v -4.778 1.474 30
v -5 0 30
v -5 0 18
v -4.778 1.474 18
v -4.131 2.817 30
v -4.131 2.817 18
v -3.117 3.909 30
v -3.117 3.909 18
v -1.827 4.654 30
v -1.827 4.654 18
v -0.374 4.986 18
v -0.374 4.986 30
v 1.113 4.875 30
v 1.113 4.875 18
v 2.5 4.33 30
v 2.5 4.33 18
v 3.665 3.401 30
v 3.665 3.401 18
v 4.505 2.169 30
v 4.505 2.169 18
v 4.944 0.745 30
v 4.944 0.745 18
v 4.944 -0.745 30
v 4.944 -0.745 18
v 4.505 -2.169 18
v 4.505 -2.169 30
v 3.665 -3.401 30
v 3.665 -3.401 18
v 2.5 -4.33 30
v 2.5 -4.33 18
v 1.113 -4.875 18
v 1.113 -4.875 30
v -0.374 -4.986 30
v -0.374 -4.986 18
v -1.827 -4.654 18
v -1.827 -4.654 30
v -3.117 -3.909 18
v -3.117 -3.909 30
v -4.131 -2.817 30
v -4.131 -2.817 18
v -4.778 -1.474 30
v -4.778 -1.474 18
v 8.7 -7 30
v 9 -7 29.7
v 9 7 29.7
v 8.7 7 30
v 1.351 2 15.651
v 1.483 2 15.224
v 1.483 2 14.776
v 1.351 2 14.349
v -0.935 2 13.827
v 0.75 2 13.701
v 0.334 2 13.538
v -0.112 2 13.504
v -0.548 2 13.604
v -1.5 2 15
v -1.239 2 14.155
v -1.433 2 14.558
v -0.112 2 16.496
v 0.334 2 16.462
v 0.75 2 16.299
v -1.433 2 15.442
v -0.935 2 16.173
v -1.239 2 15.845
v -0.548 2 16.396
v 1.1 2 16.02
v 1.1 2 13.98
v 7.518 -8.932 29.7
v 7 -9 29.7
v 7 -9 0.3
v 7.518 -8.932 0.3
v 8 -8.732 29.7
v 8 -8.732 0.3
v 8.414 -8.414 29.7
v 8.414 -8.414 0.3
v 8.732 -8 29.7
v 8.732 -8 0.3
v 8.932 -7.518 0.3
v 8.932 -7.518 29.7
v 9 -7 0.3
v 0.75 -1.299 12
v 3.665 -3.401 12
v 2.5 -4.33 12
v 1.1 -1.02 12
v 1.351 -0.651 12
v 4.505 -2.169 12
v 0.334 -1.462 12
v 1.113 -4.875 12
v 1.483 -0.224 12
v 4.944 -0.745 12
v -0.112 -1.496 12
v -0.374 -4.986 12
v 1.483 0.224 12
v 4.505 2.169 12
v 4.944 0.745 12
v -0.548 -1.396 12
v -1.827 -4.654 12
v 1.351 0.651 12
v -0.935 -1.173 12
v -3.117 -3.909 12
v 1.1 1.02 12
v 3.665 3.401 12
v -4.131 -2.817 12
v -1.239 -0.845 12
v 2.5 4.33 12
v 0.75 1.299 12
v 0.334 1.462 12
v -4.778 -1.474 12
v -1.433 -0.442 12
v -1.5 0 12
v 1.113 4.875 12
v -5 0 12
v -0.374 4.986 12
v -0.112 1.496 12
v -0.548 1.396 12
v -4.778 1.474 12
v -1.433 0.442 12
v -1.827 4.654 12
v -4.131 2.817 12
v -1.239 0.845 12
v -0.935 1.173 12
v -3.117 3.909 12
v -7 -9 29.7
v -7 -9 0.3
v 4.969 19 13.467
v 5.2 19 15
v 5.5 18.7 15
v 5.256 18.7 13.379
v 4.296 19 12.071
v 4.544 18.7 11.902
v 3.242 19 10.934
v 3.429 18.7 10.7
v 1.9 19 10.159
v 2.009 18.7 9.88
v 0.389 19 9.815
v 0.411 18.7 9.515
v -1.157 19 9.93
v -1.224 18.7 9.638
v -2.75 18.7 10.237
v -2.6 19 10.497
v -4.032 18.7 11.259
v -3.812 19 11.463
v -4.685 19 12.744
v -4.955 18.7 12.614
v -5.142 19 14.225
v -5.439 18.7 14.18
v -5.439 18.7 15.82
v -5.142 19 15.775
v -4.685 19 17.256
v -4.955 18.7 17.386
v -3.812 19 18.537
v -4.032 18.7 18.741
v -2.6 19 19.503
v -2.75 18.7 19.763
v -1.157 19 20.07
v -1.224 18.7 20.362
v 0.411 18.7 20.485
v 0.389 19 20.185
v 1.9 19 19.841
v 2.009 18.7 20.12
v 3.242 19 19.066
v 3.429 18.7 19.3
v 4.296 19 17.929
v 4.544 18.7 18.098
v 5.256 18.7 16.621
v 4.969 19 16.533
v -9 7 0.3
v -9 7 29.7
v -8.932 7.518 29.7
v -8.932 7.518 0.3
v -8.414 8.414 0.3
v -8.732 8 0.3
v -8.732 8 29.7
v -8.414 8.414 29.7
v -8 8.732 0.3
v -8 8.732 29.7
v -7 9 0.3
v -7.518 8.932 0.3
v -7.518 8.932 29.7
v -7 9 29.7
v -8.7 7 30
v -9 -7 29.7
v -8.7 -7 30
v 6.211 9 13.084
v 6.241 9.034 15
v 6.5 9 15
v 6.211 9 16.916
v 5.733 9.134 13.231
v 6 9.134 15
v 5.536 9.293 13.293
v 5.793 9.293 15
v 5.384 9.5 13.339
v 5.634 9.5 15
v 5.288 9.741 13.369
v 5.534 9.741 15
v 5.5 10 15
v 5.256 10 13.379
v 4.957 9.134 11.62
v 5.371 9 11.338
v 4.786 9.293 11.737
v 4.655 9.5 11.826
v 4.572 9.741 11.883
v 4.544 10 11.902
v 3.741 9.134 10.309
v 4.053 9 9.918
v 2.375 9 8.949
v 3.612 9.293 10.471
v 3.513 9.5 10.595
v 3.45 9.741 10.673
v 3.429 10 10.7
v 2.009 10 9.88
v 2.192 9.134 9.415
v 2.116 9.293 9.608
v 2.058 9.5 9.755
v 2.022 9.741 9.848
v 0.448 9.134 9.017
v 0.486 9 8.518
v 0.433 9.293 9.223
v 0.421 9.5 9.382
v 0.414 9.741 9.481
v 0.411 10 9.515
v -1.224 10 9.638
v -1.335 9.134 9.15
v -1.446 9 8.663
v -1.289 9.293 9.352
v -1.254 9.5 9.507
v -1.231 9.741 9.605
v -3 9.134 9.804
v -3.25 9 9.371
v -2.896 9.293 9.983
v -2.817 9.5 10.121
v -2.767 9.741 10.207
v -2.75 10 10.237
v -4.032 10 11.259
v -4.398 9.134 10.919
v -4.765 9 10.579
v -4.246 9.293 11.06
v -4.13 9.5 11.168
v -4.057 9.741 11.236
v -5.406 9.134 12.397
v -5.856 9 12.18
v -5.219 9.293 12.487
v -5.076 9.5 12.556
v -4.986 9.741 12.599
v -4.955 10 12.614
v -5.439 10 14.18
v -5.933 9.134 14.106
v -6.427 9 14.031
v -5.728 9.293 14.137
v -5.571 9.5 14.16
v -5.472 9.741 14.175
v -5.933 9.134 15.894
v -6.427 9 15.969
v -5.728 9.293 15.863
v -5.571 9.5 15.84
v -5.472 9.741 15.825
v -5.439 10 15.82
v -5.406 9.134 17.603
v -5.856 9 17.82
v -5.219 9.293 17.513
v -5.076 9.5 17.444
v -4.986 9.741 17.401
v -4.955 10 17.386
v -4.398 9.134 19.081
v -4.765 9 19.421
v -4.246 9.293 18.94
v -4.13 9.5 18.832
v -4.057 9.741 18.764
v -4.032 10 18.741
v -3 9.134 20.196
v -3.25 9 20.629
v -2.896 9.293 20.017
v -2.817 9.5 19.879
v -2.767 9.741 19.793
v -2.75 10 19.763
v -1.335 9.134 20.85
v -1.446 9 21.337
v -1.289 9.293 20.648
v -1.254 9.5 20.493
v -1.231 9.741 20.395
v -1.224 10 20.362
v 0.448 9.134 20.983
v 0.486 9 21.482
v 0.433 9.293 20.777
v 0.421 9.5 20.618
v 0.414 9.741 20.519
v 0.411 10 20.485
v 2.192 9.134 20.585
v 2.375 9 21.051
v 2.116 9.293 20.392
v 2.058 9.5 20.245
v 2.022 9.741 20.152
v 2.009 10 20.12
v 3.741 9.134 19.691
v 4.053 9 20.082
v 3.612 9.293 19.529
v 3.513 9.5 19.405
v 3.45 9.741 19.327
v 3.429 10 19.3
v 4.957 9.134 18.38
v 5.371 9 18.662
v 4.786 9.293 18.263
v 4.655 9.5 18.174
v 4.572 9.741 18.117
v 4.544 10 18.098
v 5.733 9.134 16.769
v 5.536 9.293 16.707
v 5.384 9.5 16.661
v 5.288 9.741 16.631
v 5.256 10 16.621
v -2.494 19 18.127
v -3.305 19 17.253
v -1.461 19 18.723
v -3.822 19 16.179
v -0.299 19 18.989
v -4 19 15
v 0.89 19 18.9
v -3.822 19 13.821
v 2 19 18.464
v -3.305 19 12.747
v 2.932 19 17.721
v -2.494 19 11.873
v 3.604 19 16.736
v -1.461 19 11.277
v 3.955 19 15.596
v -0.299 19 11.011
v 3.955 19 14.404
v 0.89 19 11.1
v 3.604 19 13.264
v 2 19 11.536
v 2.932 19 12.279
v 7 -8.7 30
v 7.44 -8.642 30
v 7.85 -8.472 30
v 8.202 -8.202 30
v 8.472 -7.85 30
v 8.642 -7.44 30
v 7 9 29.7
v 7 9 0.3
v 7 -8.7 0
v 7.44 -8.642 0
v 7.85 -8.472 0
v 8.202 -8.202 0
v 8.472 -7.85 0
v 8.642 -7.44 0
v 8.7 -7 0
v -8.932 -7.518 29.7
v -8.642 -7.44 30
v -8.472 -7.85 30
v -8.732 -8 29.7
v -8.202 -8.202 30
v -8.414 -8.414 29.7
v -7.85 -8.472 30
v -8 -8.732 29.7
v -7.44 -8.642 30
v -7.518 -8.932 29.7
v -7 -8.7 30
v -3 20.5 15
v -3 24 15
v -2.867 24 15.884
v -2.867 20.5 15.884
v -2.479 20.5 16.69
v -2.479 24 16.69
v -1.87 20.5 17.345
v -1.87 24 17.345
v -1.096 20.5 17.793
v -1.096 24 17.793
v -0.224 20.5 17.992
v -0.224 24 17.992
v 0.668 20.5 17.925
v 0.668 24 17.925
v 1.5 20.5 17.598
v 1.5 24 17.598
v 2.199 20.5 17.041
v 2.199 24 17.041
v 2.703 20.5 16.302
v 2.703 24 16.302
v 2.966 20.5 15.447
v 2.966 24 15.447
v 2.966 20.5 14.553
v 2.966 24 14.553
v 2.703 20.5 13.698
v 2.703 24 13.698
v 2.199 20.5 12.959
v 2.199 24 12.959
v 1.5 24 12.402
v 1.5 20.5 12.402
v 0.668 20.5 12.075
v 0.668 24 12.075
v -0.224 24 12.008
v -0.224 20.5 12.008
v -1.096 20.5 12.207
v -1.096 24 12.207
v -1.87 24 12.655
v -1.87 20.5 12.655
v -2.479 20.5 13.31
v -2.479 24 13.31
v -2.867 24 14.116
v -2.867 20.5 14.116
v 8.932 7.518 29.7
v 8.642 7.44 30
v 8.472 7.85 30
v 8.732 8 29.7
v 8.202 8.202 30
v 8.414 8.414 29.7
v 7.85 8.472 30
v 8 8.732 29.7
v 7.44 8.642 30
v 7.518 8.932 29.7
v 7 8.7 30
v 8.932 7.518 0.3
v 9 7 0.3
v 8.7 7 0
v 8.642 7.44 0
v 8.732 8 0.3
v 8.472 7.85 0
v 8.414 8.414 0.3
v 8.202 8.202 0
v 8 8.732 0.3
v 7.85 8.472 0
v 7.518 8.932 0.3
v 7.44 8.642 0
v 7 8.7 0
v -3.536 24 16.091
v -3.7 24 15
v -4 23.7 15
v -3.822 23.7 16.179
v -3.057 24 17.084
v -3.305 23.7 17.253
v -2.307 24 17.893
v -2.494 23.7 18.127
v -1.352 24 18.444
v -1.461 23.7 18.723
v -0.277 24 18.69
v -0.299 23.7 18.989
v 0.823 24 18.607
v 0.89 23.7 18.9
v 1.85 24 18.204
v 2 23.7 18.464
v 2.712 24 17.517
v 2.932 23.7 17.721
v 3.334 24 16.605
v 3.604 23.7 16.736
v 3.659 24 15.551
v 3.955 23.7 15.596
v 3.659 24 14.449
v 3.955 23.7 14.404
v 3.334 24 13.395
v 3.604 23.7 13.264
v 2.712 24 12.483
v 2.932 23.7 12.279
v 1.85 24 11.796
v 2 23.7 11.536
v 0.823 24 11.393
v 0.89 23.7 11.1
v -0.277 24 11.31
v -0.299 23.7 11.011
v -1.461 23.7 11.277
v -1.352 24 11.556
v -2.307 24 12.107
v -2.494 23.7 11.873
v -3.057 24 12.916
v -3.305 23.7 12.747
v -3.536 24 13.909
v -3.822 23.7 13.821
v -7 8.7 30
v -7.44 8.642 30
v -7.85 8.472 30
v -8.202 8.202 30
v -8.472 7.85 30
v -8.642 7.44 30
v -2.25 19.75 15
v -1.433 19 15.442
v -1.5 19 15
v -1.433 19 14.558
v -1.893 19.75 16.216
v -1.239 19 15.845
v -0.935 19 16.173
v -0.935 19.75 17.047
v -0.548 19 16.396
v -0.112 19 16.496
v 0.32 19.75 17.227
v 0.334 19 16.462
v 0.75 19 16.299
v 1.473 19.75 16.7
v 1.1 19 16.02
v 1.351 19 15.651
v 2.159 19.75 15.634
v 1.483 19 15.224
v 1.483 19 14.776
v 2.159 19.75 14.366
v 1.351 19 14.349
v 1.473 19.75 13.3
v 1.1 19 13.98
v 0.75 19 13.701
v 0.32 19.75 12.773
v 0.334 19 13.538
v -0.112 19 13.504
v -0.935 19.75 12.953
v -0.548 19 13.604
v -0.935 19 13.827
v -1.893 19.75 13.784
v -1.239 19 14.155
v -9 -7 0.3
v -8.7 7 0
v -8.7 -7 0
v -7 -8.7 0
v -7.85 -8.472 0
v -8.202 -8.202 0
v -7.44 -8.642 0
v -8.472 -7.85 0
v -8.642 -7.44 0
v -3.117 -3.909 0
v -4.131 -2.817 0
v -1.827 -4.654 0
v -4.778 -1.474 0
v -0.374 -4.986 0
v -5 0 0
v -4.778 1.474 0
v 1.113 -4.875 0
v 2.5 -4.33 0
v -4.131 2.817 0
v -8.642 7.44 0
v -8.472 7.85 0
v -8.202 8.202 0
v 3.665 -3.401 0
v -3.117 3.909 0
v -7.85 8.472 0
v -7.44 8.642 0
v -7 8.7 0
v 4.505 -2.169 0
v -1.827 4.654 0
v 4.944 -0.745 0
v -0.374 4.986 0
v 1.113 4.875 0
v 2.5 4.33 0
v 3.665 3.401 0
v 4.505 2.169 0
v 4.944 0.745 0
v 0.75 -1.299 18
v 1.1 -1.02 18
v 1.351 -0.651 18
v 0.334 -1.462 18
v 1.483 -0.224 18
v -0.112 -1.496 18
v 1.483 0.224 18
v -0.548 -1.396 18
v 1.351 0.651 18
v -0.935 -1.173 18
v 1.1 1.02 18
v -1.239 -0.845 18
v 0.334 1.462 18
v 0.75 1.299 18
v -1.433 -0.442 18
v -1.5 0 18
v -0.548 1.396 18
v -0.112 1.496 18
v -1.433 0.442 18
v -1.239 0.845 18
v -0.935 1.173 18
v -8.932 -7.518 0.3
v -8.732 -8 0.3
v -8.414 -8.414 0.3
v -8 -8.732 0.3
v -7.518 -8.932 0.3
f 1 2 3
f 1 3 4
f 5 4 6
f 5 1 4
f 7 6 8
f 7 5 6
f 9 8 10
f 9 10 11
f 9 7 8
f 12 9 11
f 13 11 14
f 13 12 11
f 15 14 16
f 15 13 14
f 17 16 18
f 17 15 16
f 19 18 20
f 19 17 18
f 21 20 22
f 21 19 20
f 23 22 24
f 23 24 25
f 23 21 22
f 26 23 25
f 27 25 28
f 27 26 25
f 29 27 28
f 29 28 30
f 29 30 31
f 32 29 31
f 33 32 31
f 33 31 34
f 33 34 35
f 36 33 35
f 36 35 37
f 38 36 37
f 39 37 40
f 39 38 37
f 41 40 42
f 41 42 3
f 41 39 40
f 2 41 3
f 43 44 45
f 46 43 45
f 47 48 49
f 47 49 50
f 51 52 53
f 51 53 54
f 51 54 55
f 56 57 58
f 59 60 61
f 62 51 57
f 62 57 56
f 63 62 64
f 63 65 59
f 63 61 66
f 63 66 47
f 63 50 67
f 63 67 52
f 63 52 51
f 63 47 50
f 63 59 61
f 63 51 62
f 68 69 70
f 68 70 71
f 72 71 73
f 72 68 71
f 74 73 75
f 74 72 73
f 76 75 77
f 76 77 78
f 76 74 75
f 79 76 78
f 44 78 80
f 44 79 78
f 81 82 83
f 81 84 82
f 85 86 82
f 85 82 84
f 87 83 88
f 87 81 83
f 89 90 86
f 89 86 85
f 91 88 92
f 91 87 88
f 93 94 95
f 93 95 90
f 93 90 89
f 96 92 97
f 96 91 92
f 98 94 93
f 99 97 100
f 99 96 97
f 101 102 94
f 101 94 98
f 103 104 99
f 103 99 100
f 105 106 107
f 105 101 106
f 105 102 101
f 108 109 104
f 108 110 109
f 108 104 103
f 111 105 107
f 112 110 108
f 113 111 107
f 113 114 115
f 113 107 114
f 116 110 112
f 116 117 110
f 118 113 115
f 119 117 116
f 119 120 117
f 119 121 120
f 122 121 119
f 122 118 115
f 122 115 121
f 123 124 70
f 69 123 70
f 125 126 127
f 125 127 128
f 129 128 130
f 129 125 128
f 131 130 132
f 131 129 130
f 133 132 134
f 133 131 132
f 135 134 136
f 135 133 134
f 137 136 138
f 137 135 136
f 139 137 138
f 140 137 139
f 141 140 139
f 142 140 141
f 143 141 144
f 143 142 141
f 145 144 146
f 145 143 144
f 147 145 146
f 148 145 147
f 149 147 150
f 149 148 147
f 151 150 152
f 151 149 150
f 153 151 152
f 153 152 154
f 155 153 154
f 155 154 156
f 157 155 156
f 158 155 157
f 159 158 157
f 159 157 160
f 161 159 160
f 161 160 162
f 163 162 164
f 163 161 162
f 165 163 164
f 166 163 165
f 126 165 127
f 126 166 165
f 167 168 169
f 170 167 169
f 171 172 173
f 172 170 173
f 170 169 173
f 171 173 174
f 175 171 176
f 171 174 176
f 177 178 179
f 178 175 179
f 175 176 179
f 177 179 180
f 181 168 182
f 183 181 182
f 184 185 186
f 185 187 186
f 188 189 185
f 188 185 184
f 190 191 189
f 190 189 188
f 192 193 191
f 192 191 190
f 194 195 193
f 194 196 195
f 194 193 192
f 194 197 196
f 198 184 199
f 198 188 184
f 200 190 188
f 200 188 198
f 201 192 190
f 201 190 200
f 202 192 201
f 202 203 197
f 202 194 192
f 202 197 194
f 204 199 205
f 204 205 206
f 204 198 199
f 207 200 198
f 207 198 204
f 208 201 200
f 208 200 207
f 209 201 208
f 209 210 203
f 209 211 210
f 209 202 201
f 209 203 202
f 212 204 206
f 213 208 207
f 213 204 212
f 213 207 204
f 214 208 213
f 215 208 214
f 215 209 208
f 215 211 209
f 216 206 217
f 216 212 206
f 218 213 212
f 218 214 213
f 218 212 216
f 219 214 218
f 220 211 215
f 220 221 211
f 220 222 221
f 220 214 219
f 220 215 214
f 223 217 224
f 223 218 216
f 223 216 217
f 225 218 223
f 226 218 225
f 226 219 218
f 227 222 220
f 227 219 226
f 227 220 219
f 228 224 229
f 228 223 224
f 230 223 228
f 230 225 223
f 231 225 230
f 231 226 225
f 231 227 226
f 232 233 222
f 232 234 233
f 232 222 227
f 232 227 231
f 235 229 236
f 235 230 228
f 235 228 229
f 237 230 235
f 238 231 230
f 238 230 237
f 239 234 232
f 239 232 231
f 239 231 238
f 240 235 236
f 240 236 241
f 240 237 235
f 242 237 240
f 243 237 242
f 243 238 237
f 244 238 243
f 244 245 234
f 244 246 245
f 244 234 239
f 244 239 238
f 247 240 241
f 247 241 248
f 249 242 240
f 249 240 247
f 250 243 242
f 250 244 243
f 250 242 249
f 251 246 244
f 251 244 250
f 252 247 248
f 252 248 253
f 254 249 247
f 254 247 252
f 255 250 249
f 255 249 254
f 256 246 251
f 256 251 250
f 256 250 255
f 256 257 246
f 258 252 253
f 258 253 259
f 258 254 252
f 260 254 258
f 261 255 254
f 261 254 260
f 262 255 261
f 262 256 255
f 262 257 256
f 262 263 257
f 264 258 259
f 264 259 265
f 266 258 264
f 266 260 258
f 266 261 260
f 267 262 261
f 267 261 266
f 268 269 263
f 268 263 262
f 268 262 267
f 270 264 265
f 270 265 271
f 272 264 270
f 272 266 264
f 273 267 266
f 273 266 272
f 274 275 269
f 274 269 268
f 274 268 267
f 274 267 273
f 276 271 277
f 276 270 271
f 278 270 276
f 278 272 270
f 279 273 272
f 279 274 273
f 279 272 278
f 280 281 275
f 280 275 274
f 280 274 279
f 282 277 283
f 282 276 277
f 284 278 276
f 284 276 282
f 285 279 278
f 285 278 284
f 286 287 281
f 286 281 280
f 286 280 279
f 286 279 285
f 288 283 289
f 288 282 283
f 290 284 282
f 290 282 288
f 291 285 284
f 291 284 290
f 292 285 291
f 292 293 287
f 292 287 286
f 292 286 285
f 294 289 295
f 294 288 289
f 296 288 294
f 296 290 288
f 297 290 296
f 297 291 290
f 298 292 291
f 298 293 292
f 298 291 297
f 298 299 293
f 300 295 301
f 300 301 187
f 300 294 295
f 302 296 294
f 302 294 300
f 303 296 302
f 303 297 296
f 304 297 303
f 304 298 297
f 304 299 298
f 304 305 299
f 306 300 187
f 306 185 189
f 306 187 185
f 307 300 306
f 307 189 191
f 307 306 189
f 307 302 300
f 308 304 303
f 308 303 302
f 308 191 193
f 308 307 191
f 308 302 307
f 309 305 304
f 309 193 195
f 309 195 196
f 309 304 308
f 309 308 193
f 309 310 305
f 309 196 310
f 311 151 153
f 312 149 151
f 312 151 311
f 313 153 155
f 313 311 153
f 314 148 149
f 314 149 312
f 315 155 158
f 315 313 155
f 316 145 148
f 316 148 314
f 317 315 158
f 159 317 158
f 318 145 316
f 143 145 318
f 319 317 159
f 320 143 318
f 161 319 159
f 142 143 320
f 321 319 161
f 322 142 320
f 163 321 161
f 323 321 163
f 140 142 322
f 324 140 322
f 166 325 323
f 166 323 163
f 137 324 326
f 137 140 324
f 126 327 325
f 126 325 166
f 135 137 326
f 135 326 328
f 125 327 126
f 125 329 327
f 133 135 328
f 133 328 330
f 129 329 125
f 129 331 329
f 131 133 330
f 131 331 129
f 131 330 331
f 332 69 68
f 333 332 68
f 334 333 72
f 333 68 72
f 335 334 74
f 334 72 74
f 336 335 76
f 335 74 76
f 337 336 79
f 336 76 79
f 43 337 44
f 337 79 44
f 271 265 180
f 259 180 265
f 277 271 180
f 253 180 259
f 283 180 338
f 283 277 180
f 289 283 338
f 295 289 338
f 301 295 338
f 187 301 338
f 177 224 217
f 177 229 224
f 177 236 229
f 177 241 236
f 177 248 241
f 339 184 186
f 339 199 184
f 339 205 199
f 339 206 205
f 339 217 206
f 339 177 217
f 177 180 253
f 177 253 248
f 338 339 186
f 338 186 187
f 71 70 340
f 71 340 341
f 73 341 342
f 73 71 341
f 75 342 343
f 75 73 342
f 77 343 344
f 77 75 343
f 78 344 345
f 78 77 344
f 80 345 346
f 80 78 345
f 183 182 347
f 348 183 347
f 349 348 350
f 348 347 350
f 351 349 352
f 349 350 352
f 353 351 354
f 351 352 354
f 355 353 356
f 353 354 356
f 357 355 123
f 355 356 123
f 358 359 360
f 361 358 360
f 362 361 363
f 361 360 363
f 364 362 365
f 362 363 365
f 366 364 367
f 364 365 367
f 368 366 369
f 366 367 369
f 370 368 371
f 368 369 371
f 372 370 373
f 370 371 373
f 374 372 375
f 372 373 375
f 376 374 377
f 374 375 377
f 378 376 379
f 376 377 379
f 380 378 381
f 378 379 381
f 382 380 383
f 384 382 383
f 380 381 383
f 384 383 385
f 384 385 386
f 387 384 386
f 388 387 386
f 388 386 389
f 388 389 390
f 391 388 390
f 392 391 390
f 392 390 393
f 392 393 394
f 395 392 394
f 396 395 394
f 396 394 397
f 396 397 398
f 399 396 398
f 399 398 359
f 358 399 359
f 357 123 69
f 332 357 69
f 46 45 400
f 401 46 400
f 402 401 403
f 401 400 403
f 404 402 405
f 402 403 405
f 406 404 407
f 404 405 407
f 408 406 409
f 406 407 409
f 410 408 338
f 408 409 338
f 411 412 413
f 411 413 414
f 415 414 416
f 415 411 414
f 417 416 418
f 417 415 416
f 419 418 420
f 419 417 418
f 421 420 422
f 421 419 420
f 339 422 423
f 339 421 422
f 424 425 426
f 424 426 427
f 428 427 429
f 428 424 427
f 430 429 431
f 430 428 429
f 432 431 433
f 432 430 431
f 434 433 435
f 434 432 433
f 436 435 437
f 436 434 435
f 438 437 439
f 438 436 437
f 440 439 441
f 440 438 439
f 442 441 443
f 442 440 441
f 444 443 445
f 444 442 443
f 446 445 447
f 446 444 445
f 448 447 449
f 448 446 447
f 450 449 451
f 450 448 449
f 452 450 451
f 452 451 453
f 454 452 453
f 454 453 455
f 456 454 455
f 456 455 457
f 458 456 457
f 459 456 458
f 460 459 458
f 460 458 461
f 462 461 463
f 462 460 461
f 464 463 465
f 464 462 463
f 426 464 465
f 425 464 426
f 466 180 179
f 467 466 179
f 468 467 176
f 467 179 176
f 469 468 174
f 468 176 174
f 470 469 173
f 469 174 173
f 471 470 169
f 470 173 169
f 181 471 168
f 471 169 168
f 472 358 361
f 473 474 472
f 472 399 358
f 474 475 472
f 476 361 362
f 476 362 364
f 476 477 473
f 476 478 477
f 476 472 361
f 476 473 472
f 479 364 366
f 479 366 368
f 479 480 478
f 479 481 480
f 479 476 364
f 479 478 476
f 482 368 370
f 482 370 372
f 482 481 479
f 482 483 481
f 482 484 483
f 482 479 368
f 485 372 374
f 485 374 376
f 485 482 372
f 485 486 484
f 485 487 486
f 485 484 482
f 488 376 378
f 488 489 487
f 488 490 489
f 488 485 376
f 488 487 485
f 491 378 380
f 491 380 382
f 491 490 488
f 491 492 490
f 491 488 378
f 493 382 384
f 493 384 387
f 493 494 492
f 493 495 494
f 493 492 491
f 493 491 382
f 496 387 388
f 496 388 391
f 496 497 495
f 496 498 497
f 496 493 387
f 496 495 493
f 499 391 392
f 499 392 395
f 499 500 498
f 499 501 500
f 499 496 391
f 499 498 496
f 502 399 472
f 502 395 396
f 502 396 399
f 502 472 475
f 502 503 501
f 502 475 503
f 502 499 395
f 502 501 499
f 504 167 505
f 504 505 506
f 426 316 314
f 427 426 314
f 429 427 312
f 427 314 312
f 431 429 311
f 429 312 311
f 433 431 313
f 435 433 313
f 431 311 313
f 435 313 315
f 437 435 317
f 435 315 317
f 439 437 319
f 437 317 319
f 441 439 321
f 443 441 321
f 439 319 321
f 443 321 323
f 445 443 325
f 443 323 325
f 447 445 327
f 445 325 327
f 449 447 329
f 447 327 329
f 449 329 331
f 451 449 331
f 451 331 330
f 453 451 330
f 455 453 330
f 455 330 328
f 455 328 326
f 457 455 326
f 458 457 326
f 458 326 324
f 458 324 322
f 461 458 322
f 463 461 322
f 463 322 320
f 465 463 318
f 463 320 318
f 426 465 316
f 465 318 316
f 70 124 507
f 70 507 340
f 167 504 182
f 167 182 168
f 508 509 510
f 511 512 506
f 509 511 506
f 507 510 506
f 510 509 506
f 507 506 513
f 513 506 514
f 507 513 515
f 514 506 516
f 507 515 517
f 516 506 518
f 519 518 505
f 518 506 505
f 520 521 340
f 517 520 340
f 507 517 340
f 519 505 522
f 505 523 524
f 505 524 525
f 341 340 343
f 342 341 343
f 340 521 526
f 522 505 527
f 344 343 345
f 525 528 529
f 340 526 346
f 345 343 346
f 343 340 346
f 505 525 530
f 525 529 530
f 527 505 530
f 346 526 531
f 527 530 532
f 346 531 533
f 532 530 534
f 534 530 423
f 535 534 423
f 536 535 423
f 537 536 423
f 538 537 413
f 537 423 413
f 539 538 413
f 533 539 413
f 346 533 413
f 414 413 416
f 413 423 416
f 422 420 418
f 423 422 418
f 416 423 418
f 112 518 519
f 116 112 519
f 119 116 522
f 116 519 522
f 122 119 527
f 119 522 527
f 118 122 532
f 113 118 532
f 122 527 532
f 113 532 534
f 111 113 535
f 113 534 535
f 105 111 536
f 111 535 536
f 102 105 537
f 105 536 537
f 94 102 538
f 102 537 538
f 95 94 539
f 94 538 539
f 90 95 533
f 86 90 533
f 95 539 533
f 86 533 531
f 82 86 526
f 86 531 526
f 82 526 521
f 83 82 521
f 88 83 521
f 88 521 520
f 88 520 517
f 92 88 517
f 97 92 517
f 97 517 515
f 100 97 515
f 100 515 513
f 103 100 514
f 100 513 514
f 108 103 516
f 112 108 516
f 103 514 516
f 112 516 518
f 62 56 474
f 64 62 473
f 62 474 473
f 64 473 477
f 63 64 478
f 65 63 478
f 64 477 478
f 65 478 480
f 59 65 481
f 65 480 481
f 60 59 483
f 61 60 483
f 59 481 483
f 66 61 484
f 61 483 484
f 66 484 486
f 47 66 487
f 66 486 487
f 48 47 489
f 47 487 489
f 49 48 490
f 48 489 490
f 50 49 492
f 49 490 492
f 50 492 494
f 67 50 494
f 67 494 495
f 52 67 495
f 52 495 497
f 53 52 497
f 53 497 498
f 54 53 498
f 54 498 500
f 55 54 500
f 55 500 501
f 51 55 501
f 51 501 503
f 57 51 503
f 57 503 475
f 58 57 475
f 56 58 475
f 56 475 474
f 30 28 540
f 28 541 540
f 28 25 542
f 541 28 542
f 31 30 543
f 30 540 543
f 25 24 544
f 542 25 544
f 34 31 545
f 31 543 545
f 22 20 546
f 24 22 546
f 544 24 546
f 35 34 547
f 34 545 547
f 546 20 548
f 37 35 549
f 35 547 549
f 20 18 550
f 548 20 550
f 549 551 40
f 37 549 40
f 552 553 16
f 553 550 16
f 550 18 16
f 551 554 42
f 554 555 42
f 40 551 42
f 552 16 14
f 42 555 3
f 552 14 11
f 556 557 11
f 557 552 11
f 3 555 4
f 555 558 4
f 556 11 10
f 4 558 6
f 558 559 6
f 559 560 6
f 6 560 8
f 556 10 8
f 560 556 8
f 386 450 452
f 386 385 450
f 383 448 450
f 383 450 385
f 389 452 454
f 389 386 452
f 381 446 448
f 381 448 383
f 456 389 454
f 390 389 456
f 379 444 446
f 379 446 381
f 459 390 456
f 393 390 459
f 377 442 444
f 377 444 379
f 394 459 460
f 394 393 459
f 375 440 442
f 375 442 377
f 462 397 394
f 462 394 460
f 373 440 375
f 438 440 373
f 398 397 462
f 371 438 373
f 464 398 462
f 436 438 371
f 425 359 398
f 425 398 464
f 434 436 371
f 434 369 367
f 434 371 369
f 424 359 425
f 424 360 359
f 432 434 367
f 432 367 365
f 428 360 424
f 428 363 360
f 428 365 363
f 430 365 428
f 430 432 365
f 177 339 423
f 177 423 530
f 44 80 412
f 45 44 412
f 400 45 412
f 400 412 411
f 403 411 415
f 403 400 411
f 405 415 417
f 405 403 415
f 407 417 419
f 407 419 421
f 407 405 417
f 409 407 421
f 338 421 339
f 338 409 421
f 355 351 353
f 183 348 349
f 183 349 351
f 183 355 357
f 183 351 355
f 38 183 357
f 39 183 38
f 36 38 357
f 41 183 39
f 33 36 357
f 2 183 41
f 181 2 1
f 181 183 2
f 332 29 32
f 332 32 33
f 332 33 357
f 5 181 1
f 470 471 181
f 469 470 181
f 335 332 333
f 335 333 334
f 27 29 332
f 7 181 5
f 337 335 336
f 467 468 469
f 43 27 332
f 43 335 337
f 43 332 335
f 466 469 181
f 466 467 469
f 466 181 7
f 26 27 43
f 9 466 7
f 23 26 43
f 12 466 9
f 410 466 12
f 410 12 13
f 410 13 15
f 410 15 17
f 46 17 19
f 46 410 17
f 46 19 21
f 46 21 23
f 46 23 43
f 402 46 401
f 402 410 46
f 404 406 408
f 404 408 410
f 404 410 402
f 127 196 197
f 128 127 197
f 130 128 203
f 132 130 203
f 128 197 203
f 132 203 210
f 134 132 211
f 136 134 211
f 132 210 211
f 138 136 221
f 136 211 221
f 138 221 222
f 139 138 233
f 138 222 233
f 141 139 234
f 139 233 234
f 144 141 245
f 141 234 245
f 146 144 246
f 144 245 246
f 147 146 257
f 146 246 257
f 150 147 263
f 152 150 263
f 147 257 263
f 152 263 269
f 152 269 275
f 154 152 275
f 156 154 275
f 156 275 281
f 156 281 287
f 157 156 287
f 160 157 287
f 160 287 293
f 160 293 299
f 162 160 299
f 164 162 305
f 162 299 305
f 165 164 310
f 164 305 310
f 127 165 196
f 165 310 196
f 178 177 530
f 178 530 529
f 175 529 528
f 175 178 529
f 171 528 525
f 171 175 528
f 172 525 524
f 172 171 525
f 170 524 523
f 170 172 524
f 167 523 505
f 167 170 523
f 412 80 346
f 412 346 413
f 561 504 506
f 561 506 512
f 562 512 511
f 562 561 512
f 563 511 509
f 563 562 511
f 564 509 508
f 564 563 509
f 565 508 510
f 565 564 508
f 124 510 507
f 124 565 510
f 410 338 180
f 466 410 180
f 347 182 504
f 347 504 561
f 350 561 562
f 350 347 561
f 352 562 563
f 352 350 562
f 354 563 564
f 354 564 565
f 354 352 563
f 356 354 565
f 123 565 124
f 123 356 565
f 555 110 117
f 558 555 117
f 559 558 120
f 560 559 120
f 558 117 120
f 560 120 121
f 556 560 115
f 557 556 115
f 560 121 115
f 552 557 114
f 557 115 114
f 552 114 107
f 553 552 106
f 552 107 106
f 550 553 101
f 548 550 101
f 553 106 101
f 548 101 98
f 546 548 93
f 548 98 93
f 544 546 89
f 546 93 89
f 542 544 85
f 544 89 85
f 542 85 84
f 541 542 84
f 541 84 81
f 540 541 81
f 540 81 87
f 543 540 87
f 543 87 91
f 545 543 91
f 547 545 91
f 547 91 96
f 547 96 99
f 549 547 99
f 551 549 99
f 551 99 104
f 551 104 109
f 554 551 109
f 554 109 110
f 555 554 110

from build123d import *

# Parameters (mm, degrees)
SKETCH1_W           = 18
SKETCH1_H           = 18
BOSS_EXTRUDE1_DEPTH = 30
FILLET1_R           = 2
SKETCH2_R           = 5
CUT_EXTRUDE1_DEPTH  = 12
SKETCH3_R           = 5.5
BOSS_EXTRUDE2_DEPTH = 10
SKETCH4_R           = 4
BOSS_EXTRUDE3_DEPTH = 5
SKETCH5_R           = 3
CUT_EXTRUDE2_DEPTH  = 3
SKETCH6_R           = 1.5
CUT_EXTRUDE3_DEPTH  = 19
CHAMFER1_SIZE       = 2
FILLET2_R           = 1
SKETCH7_R           = 1.5
CUT_EXTRUDE4_DEPTH  = 32.320919527
CHAMFER2_SIZE       = 0.3


with BuildPart() as part:
    # Sketch1 → Boss-Extrude1 (new body)
    with BuildSketch(Plane.XY):
        Rectangle(SKETCH1_W, SKETCH1_H)
    extrude(amount=BOSS_EXTRUDE1_DEPTH)

    # Fillet1
    fillet1_edges = [part.edges().sort_by_distance(p)[0] for p in [
        (-9, 9, 15),
        (9, 9, 15),
        (9, -9, 15),
        (-9, -9, 15),
    ]]
    fillet(fillet1_edges, radius=FILLET1_R)

    # Sketch2 → Cut-Extrude1 (cut)
    with BuildSketch(Plane(origin=(0, 0, 0), x_dir=(-1, 0, 0), z_dir=(0, 0, -1))):
        Circle(SKETCH2_R)
    cut_extrude1 = extrude(amount=-CUT_EXTRUDE1_DEPTH, mode=Mode.SUBTRACT)

    # Mirror1: Cut-Extrude1 across plane
    add(cut_extrude1.mirror(Plane.XY.offset(15)), mode=Mode.SUBTRACT)

    # Sketch3 → Boss-Extrude2 (add)
    with BuildSketch(Plane(origin=(0, 9, 0), x_dir=(1, 0, 0), z_dir=(0, 1, 0))):
        with Locations((0, -15)):
            Circle(SKETCH3_R)
    extrude(amount=BOSS_EXTRUDE2_DEPTH)

    # Sketch4 → Boss-Extrude3 (add)
    with BuildSketch(Plane(origin=(0, 19, 0), x_dir=(1, 0, 0), z_dir=(0, 1, 0))):
        with Locations(Location((0, -15, 0), (0, 0, 180))):
            Circle(SKETCH4_R)
    extrude(amount=BOSS_EXTRUDE3_DEPTH)

    # Sketch5 → Cut-Extrude2 (cut)
    with BuildSketch(Plane(origin=(0, 24, 0), x_dir=(1, 0, 0), z_dir=(0, 1, 0))):
        with Locations(Location((0, -15, 0), (0, 0, 180))):
            Circle(SKETCH5_R)
    extrude(amount=-CUT_EXTRUDE2_DEPTH, mode=Mode.SUBTRACT)

    # Sketch6 → Cut-Extrude3 (cut)
    with BuildSketch(Plane(origin=(0, 21, 0), x_dir=(1, 0, 0), z_dir=(0, 1, 0))):
        with Locations(Location((0, -15, 0), (0, 0, 180))):
            Circle(SKETCH6_R)
    extrude(amount=-CUT_EXTRUDE3_DEPTH, mode=Mode.SUBTRACT)

    # Chamfer1
    # the kernel refuses this chamfer: 2 mm, written as the material it takes off along each edge
    with BuildSketch(Plane(origin=(0, 21, 15), x_dir=(-1, 0, 0), z_dir=(0, 0, -1))) as chamfer1_piece_1_section:
        Polygon((1.5 + CHAMFER1_SIZE, 0), (1.5, -CHAMFER1_SIZE), (1.5, 0), align=None)
    chamfer1_piece_1 = revolve(axis=Axis((0, 21, 15), (0, 1, 0)), mode=Mode.PRIVATE)
    chamfer1_piece_1 = chamfer1_piece_1 & Plane(origin=(0, 19.742805432, 15), x_dir=(-1, 0, 0), z_dir=(0, 1, 0)) * Cylinder(3, 14, mode=Mode.PRIVATE)
    add(chamfer1_piece_1, mode=Mode.SUBTRACT)

    # Fillet2
    fillet2_edges = [part.edges().sort_by_distance(p)[0] for p in [
        (-5.5, 9, 15),
    ]]
    fillet(fillet2_edges, radius=FILLET2_R)

    # Sketch7 → Cut-Extrude4 (cut, through all)
    with BuildSketch(Plane(origin=(0, 0, 12), x_dir=(-1, 0, 0), z_dir=(0, 0, -1))):
        Circle(SKETCH7_R)
    extrude(amount=-CUT_EXTRUDE4_DEPTH, mode=Mode.SUBTRACT)

    # Chamfer2
    chamfer2_edges = [part.edges().sort_by_distance(p)[0] for p in [
        (9, 0, 0),
        (9, 0, 30),
        (-9, 0, 0),
        (0, 9, 0),
        (0, -9, 0),
        (-8.414213562, 8.414213562, 0),
        (8.414213562, 8.414213562, 0),
        (-8.414213562, -8.414213562, 0),
        (8.414213562, -8.414213562, 0),
        (0, -9, 30),
        (-9, 0, 30),
        (0, 9, 30),
        (-8.414213562, 8.414213562, 30),
        (8.414213562, 8.414213562, 30),
        (-8.414213562, -8.414213562, 30),
        (8.414213562, -8.414213562, 30),
        (-5.5, 19, 15),
        (4, 24, 15),
    ]]
    chamfer(chamfer2_edges, length=CHAMFER2_SIZE)


solid = part.part
